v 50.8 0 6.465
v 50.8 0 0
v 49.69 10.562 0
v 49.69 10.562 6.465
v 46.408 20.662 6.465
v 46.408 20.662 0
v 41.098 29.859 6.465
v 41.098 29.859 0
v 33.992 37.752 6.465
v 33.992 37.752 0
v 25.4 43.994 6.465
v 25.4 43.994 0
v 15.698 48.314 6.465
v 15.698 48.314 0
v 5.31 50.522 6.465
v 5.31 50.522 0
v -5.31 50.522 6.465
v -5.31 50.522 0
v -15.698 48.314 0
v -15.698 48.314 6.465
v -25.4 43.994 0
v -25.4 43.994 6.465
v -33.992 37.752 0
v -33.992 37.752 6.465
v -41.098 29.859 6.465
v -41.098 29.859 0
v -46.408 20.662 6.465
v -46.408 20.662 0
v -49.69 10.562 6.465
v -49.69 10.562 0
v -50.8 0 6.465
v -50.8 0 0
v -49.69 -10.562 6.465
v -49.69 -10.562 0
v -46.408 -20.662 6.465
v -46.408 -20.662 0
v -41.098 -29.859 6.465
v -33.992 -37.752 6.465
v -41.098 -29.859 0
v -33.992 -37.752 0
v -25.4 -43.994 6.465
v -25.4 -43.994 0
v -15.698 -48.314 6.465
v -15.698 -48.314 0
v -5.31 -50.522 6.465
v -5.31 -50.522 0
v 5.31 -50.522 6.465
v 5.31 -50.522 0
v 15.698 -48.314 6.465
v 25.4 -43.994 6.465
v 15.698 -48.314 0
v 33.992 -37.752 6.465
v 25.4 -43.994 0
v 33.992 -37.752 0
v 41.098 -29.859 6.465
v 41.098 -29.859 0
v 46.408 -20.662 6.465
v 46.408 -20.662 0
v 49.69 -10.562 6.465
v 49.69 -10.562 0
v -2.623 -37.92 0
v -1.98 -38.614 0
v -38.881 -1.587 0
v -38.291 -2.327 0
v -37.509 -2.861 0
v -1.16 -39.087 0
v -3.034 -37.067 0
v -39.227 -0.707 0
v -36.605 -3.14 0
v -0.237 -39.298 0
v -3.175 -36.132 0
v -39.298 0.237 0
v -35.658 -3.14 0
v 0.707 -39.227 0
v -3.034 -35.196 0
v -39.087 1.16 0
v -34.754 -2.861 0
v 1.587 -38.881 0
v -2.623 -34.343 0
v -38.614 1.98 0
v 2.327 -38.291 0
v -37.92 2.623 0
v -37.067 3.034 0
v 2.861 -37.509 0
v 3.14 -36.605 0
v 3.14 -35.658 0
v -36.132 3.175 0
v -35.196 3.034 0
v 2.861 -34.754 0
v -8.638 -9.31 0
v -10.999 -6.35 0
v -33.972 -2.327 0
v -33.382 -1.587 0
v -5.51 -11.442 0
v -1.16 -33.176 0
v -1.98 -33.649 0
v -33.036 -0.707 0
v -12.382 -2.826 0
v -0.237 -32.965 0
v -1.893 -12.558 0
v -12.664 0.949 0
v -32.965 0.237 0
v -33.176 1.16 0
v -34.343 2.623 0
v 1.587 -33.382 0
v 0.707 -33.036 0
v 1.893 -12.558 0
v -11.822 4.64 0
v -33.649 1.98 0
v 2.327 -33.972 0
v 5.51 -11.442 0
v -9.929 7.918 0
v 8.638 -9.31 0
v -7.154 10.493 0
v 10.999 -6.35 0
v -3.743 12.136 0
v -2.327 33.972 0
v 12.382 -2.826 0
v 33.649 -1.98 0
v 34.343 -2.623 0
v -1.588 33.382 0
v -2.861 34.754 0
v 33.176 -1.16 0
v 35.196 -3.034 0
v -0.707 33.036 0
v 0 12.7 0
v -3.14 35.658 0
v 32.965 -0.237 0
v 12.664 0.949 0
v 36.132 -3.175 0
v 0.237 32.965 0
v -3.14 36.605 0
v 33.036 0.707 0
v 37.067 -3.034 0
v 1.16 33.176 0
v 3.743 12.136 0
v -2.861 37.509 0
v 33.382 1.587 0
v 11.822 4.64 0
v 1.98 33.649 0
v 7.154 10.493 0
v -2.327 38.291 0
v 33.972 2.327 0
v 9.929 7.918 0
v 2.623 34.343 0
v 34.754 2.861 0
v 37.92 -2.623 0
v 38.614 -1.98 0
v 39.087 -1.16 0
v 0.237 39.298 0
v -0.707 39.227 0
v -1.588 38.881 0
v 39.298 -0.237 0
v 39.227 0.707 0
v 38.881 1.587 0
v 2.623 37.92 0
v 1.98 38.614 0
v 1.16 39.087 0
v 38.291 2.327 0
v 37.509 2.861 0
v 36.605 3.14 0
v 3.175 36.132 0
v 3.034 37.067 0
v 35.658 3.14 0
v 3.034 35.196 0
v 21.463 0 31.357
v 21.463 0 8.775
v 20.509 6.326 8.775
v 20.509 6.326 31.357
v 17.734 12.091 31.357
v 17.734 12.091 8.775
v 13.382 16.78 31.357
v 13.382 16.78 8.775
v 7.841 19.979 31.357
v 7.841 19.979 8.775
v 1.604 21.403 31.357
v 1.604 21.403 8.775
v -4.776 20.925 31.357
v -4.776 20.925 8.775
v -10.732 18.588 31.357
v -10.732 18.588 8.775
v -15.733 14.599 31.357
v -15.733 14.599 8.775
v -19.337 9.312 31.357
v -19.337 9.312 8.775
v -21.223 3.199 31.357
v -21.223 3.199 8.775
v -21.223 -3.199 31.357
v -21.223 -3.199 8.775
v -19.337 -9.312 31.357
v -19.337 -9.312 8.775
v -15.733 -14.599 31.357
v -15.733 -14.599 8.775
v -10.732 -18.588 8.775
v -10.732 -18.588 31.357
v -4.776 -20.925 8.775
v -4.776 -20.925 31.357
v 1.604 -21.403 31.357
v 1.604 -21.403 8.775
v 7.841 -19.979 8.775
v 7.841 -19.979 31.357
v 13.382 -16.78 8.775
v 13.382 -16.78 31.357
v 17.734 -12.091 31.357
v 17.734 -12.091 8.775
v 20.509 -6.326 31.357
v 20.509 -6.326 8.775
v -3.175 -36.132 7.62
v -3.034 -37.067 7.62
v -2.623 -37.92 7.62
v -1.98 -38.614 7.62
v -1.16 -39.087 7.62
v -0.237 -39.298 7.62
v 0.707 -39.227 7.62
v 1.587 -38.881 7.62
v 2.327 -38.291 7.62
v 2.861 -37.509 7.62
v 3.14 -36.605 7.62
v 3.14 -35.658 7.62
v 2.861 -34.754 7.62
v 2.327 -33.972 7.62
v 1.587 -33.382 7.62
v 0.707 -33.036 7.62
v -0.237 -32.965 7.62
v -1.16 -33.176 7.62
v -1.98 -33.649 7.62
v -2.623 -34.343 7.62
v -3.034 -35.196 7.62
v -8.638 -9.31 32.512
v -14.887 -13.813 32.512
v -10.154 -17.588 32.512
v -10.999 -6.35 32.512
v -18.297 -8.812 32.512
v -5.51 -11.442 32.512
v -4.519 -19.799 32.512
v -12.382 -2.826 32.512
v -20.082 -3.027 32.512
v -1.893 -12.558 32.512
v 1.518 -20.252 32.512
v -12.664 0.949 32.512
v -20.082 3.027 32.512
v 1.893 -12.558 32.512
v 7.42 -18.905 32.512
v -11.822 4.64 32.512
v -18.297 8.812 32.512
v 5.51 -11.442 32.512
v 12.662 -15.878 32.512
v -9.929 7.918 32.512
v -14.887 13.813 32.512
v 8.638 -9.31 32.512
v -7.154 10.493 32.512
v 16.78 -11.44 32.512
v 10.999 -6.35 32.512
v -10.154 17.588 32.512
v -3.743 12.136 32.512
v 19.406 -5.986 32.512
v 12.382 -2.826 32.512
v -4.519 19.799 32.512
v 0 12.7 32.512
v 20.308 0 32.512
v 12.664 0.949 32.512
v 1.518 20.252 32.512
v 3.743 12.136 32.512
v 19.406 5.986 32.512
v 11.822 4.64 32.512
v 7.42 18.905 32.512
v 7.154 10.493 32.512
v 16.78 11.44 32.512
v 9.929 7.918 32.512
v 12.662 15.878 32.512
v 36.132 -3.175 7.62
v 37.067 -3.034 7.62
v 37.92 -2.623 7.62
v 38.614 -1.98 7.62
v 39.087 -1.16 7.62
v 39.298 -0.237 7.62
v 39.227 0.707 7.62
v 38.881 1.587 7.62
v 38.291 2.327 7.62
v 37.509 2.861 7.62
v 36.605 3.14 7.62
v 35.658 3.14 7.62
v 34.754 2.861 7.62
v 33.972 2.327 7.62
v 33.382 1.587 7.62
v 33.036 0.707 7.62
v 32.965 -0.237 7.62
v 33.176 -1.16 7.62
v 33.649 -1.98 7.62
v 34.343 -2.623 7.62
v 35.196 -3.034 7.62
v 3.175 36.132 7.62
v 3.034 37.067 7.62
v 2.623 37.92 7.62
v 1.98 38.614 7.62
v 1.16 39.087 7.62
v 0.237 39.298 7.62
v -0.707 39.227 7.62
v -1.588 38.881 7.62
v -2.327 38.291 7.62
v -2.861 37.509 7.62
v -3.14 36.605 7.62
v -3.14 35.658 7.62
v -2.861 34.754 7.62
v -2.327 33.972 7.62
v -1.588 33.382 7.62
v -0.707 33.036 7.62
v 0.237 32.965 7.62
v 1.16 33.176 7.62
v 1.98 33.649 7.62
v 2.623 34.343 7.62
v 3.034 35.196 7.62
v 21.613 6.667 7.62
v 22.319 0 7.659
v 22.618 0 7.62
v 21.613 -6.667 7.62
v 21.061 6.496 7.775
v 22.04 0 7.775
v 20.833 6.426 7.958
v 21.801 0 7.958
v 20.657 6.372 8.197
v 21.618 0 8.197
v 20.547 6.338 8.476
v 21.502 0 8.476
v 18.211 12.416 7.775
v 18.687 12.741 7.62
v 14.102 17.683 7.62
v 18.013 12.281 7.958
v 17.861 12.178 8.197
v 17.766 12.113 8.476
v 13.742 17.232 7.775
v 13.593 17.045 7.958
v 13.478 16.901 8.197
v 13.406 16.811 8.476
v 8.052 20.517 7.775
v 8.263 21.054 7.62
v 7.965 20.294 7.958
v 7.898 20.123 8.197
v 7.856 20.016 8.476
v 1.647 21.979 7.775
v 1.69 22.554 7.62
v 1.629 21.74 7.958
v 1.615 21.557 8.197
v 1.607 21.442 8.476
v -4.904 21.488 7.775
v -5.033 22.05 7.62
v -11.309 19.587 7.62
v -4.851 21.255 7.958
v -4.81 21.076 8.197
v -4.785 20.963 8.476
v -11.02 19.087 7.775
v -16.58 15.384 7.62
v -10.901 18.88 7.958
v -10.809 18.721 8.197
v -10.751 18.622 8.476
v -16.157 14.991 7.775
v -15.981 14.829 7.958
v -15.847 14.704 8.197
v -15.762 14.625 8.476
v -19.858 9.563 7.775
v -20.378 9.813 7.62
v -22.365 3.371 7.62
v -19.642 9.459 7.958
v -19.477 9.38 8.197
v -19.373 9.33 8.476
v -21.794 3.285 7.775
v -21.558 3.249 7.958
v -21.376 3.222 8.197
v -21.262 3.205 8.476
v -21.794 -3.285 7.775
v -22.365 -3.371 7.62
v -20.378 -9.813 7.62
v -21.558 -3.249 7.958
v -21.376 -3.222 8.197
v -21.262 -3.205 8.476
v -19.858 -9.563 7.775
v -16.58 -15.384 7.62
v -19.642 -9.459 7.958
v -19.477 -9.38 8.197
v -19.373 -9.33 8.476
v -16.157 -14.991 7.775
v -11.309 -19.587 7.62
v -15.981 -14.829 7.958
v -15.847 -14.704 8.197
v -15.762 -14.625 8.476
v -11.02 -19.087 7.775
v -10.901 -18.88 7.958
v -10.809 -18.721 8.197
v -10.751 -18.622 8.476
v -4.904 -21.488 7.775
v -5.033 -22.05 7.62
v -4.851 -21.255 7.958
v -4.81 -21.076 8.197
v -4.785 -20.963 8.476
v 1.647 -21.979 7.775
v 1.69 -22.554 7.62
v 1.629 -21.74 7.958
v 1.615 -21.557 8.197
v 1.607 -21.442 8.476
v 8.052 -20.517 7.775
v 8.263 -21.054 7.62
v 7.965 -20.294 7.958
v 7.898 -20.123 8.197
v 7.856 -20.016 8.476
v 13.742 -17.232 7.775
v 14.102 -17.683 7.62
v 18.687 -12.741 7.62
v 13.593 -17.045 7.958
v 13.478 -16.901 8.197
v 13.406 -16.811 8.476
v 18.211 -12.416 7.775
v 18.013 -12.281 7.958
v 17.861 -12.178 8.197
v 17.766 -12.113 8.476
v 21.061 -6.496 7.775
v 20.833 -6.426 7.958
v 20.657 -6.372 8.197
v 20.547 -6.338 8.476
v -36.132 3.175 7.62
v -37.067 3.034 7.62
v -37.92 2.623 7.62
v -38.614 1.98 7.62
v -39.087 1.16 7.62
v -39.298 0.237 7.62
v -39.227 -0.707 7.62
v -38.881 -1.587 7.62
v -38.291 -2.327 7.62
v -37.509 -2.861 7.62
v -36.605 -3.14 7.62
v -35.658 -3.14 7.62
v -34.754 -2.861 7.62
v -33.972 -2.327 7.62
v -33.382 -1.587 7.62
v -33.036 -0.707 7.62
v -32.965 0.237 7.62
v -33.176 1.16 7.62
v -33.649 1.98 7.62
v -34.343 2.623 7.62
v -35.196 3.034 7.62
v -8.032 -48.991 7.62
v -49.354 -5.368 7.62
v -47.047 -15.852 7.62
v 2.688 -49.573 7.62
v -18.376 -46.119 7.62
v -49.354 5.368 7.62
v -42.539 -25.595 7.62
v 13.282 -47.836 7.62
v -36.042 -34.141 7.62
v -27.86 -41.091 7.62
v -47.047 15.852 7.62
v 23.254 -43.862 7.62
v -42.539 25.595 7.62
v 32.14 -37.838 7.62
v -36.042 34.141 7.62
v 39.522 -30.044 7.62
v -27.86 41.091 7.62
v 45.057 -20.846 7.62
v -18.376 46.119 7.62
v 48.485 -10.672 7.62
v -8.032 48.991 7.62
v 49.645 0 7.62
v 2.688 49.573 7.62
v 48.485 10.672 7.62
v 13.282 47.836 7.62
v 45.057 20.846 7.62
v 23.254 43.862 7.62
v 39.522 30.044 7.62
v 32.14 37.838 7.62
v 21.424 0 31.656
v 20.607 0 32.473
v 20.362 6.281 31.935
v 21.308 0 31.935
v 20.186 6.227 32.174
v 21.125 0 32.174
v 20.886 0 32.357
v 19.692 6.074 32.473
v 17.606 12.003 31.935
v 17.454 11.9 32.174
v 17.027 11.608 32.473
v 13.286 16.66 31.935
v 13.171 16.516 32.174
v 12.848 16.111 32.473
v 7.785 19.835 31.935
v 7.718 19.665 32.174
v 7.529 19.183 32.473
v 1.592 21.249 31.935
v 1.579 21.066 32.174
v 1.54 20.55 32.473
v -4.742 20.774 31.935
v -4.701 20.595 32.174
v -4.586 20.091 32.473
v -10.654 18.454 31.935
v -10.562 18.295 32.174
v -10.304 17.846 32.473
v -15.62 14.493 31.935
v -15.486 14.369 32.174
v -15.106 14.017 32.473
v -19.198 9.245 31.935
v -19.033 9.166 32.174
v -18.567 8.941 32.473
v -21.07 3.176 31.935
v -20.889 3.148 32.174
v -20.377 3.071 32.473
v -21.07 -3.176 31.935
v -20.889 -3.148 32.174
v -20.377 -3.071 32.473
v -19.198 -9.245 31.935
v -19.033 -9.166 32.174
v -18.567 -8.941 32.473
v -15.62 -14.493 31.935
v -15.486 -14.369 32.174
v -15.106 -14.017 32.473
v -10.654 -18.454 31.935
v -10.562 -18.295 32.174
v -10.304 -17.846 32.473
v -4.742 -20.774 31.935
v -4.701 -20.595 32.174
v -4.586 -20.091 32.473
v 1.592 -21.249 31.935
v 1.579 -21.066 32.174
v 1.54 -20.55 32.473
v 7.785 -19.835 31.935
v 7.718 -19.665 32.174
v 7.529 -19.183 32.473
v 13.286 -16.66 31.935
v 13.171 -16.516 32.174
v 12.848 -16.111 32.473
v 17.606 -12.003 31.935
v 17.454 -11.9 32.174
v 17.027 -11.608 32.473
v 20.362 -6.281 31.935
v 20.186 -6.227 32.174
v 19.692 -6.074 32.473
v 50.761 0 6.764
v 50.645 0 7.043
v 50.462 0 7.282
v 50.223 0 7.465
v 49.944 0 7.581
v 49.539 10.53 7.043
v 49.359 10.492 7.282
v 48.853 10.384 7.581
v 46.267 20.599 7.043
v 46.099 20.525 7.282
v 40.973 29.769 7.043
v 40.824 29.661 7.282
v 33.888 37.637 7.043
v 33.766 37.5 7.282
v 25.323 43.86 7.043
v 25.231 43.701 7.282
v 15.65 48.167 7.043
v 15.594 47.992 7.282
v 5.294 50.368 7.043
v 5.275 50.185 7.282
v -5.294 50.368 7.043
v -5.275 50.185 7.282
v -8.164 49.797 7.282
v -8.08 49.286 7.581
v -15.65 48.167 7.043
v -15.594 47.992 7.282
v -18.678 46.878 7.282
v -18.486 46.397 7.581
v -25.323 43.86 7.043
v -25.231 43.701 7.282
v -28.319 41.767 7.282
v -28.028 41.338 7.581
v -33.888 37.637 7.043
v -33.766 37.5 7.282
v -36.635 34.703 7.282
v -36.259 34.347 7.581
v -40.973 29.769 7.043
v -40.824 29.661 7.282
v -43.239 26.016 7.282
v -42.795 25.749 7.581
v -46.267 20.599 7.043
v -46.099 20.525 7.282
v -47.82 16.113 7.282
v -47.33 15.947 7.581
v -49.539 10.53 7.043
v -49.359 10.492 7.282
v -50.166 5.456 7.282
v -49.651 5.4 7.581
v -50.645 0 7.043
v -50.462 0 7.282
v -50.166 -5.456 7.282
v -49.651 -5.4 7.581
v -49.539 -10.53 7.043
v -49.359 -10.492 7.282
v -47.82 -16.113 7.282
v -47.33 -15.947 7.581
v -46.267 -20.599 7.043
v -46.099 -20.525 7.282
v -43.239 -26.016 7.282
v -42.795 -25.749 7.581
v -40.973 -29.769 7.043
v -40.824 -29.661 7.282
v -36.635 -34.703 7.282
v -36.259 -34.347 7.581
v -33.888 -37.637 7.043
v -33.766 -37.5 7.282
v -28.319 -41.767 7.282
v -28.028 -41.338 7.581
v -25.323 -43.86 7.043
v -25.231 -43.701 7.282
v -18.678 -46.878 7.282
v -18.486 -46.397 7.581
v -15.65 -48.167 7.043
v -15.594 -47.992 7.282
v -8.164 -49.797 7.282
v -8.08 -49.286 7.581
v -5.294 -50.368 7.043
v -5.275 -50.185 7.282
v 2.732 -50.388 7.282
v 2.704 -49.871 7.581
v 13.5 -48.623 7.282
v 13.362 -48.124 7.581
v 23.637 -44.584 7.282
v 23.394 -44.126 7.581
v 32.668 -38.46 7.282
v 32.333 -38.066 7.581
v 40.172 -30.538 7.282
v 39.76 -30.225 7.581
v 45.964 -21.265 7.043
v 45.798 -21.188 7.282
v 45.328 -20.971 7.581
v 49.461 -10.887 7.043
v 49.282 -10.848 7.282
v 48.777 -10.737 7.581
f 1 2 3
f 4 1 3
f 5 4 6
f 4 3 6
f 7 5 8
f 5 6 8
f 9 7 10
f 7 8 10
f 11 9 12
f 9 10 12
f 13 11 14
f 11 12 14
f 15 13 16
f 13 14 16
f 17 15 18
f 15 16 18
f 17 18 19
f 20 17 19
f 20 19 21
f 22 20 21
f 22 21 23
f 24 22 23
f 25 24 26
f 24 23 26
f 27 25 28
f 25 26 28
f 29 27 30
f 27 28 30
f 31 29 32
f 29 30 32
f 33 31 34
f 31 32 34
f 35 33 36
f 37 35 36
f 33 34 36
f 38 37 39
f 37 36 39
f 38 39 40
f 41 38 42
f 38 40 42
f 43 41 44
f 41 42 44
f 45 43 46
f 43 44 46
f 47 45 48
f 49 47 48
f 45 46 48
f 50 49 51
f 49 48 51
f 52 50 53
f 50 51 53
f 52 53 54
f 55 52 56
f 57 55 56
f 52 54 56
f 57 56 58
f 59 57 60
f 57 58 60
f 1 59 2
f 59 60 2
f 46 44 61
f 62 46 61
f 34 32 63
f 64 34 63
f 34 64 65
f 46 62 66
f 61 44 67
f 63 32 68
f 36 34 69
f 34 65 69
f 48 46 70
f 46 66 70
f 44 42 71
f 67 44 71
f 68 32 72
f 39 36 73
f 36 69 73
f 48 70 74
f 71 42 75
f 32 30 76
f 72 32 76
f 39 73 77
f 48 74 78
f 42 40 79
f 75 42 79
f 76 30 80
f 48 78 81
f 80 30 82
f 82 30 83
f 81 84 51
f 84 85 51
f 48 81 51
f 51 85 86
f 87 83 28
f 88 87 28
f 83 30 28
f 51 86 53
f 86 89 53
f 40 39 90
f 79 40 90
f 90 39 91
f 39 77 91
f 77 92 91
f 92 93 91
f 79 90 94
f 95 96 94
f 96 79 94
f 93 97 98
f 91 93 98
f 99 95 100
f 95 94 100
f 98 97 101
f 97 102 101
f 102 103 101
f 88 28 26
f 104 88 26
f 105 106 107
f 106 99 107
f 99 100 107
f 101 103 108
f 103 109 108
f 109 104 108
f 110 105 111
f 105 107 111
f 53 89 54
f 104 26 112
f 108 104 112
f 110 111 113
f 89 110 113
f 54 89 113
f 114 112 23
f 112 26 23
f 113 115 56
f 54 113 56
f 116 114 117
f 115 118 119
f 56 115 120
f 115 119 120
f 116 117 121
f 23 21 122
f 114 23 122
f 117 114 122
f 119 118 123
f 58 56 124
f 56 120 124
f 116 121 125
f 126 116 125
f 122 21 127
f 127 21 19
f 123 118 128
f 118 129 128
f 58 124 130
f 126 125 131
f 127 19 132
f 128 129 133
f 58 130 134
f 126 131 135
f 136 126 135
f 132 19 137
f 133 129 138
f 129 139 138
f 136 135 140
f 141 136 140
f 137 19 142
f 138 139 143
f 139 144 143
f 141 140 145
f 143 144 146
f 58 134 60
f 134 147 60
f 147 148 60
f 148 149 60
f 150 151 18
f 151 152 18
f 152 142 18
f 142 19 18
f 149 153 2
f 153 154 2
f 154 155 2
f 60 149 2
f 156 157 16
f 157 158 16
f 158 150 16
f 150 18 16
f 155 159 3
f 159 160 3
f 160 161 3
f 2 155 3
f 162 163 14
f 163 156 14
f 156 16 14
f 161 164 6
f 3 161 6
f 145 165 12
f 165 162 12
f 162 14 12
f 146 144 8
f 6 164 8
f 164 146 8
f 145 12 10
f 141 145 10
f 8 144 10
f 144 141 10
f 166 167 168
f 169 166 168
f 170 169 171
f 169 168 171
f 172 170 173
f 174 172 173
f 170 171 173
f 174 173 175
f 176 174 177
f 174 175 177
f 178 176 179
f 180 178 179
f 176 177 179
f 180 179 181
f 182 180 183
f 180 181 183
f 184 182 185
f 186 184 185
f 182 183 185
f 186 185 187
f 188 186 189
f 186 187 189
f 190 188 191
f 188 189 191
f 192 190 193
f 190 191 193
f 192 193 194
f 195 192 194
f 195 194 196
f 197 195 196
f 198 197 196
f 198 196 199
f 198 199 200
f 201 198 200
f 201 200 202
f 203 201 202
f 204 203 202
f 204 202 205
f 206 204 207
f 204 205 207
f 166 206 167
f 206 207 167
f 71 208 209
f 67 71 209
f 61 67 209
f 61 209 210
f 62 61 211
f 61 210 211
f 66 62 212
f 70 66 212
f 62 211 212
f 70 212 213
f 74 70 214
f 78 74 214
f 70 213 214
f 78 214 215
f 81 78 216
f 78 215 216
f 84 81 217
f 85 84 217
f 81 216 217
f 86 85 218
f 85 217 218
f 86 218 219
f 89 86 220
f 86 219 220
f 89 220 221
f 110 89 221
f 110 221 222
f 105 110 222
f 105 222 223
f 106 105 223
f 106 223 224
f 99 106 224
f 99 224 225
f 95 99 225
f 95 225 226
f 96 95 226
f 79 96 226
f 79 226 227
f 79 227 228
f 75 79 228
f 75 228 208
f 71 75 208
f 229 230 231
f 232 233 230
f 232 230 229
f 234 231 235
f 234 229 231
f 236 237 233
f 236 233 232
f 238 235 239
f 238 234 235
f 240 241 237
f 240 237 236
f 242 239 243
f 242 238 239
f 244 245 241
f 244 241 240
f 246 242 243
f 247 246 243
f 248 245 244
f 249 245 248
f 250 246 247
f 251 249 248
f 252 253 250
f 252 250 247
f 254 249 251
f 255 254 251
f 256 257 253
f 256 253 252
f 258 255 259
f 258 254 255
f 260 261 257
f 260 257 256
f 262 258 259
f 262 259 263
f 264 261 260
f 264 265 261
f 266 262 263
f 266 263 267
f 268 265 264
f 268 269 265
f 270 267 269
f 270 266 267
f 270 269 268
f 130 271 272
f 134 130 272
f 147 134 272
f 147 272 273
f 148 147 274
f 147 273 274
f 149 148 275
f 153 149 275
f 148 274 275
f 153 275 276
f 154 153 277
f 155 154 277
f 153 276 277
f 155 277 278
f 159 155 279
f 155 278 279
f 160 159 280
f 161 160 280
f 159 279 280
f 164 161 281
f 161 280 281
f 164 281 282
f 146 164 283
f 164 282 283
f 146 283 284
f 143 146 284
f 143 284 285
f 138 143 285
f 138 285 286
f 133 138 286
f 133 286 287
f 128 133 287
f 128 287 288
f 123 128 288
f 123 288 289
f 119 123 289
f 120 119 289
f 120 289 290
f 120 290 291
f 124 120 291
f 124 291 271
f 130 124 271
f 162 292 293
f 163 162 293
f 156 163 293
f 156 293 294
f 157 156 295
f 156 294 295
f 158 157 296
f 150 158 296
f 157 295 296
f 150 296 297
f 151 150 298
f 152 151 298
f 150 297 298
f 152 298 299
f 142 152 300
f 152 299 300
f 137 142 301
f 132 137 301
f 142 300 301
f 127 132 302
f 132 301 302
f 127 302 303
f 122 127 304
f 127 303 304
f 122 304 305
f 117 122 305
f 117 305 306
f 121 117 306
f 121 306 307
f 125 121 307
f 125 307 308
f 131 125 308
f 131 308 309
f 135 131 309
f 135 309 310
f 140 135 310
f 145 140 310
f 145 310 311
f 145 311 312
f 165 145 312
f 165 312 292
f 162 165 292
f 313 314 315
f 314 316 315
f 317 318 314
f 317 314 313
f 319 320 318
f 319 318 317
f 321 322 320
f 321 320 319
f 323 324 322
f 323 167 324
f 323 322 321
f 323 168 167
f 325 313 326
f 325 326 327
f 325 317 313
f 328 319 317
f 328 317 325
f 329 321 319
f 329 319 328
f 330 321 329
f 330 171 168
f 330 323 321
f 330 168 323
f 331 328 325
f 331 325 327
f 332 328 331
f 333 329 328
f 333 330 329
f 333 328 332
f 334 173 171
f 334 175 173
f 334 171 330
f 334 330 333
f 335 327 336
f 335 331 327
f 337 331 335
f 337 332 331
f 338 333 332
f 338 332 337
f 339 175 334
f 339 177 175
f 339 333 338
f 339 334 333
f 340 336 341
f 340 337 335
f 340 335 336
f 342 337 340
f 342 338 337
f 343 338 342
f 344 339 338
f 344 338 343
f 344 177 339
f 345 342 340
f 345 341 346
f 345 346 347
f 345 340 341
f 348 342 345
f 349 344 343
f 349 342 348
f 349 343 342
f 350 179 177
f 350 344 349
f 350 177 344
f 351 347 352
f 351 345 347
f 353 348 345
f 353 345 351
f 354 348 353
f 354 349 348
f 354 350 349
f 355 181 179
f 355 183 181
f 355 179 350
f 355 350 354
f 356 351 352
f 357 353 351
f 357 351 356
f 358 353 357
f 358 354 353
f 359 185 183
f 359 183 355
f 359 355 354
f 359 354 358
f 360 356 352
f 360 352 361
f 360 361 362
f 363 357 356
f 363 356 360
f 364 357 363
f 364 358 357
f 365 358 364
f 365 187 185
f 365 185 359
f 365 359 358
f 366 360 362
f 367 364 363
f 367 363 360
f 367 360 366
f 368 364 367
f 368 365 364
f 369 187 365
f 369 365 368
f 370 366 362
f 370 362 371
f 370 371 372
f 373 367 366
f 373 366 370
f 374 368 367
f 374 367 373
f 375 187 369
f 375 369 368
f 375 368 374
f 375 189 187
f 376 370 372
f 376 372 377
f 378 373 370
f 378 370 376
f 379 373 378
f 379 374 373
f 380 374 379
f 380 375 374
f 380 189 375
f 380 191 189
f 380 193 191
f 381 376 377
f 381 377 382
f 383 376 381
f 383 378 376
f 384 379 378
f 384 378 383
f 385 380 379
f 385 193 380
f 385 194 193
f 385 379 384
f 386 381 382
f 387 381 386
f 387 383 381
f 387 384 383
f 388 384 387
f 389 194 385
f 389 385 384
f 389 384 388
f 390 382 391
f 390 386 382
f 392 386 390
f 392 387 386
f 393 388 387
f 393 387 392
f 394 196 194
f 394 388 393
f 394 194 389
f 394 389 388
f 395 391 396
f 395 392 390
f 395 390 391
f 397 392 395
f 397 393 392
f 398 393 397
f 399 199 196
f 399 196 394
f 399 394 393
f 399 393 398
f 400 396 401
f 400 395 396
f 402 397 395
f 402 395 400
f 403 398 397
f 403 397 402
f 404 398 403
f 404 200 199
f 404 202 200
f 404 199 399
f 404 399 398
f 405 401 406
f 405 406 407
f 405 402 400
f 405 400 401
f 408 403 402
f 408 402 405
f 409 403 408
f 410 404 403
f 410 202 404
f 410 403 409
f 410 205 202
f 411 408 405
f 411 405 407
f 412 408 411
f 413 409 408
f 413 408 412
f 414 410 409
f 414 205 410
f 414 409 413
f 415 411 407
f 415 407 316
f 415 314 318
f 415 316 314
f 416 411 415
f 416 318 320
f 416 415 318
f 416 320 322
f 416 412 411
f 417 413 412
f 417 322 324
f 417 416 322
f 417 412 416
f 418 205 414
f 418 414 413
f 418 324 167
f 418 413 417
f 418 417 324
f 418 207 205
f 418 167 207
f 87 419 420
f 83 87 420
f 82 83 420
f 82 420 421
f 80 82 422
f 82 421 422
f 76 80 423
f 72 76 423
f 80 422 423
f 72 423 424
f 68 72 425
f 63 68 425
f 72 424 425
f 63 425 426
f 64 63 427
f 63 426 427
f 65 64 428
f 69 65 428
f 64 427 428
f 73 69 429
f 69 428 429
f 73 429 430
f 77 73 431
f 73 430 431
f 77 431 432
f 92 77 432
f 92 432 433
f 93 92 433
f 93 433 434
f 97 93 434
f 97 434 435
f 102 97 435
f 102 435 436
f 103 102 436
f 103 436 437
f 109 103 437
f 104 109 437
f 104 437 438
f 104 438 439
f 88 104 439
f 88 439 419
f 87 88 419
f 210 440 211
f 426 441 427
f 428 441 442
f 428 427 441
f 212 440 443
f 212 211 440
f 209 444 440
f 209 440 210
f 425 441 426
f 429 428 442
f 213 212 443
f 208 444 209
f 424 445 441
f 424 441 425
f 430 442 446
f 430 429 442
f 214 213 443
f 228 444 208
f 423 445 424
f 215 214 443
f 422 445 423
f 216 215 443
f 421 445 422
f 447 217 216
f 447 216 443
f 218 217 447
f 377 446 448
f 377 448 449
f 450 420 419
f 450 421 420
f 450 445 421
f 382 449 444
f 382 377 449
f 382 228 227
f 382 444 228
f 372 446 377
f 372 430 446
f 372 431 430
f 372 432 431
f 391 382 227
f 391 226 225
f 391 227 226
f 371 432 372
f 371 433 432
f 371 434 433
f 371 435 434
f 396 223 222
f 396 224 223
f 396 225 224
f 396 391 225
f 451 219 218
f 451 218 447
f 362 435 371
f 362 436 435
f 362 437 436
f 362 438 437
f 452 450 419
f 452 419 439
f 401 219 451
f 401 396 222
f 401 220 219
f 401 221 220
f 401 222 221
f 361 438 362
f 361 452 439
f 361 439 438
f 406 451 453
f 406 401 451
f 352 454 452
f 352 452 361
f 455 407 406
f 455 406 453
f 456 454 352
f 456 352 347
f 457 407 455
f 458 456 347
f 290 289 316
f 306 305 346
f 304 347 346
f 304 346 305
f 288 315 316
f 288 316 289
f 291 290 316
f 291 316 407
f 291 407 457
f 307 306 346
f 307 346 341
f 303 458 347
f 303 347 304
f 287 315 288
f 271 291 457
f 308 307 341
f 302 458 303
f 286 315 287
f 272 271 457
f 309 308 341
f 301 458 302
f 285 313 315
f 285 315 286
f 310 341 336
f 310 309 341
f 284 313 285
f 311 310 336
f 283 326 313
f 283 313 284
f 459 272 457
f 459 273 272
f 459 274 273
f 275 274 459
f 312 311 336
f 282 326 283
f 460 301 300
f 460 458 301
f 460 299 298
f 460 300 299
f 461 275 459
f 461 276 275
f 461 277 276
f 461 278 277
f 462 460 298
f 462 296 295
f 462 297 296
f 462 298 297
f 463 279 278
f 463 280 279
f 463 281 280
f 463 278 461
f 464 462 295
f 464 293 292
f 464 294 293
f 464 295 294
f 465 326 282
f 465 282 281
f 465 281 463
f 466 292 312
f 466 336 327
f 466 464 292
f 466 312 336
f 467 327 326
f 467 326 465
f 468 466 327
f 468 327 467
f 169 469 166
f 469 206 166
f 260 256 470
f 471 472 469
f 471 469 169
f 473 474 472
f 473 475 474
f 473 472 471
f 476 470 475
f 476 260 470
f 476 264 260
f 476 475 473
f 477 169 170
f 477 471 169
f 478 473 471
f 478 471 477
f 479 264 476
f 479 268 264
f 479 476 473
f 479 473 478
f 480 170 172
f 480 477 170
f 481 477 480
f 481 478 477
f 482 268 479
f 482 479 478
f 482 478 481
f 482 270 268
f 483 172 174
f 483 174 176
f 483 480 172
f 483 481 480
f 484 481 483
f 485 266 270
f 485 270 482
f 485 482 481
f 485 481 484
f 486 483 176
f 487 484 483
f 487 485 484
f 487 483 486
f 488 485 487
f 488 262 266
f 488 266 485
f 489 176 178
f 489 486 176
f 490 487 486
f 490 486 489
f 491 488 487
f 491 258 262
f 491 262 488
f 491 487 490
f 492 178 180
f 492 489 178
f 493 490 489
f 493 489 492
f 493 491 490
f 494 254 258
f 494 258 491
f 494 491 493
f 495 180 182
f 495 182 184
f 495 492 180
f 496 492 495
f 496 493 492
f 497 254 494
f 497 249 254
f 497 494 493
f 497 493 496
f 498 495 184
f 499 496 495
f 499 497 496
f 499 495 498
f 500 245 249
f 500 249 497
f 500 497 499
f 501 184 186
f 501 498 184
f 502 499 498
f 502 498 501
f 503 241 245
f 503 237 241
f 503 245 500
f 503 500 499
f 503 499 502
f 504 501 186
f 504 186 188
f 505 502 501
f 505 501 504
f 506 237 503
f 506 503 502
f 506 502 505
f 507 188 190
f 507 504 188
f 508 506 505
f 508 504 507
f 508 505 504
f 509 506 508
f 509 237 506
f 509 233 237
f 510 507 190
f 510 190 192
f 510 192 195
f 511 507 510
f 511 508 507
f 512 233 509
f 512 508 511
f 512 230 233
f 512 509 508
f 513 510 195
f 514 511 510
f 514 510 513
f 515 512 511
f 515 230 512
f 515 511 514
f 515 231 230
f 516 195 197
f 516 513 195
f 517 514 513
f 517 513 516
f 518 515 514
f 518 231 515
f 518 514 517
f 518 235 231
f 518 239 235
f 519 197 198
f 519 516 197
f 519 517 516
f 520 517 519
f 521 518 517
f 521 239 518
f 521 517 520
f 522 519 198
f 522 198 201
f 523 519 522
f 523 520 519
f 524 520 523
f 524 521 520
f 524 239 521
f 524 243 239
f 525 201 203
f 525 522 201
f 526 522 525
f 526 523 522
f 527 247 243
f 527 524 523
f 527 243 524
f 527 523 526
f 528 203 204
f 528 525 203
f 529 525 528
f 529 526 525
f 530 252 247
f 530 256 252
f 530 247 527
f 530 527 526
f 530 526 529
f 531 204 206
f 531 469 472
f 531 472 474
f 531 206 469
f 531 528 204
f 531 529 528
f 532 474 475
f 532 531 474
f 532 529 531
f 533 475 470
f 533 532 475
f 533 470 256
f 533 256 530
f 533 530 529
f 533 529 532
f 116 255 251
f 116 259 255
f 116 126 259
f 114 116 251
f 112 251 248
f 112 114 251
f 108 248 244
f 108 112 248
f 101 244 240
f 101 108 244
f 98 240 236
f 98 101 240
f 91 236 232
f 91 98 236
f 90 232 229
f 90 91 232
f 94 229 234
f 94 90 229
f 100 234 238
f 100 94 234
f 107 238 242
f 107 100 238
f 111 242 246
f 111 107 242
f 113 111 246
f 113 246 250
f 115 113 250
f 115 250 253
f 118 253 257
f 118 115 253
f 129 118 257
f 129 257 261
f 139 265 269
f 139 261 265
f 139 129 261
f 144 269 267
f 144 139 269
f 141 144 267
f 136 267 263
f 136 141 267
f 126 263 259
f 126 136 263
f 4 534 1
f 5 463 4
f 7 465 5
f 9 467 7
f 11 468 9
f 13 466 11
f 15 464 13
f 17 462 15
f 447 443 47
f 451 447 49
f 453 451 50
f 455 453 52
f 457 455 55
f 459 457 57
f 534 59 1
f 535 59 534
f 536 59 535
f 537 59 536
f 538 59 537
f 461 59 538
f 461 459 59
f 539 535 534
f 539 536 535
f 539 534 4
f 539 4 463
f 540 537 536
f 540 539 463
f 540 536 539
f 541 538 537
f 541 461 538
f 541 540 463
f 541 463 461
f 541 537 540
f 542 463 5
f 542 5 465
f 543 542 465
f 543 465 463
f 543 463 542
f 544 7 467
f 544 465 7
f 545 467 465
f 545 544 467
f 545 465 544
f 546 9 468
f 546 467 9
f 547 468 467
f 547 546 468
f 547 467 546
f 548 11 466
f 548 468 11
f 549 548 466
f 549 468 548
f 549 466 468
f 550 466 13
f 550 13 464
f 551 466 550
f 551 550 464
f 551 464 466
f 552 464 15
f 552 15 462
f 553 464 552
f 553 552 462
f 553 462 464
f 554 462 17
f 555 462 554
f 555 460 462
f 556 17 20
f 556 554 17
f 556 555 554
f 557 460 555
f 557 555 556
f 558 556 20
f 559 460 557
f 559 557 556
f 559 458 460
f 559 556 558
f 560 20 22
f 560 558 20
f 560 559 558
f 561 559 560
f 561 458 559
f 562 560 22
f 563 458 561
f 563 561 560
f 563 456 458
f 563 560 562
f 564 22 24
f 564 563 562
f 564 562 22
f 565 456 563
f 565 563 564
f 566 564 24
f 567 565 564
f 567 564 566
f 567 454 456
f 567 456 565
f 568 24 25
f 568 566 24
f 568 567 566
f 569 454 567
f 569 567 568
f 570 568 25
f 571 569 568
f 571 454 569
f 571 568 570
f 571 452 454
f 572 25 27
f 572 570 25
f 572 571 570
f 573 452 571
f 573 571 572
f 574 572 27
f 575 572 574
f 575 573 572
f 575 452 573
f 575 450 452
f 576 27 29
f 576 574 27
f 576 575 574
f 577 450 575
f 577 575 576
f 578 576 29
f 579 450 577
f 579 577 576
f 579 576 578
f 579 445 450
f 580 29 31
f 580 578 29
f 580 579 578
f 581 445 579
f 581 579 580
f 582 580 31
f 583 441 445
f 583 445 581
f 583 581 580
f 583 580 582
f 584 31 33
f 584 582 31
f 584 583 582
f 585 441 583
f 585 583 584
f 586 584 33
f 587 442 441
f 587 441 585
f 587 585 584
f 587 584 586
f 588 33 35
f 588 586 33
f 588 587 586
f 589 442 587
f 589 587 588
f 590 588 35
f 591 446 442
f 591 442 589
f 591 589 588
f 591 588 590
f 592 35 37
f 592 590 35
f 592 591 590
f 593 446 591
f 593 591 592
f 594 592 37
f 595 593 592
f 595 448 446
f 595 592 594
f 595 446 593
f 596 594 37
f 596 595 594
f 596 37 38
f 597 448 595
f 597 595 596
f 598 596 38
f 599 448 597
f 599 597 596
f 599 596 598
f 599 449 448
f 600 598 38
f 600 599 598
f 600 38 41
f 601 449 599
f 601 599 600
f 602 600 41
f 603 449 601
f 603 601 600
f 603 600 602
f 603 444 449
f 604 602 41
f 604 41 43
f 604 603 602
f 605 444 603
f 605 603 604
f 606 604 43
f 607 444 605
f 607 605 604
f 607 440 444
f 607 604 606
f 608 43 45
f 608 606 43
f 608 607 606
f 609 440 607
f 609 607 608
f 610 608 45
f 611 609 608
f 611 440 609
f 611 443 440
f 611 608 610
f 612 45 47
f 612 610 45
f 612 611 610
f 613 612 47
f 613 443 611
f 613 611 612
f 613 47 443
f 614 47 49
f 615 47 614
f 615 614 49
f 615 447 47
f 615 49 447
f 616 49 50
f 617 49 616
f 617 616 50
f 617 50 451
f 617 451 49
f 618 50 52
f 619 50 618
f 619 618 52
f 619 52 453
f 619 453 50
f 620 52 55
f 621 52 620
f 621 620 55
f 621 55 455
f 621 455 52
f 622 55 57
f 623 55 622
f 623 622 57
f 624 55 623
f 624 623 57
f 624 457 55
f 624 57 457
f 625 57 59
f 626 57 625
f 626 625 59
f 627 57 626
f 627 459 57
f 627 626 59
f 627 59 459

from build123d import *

# Parameters (mm, degrees)
SKETCH1_R         = 50.8
EXTRUDE1_DEPTH    = 7.62
SKETCH2_R         = 21.463
EXTRUDE2_DEPTH    = 24.892
SKETCH3_R         = 3.175
EXTRUDE3_DEPTH    = 8.62
CIRPATTERN1_COUNT = 4
FILLET1_R         = 1.154545455
SKETCH4_W         = 79.017488084
SKETCH4_H         = 12.7


with BuildPart() as part:
    # Sketch1 → Extrude1 (new body)
    with BuildSketch(Plane.XY):
        Circle(SKETCH1_R)
    extrude(amount=EXTRUDE1_DEPTH)

    # Sketch2 → Extrude2 (add)
    with BuildSketch(Plane.XY.offset(7.62)):
        Circle(SKETCH2_R)
    extrude(amount=EXTRUDE2_DEPTH)

    # Sketch3 → Extrude3 (cut, through all)
    with BuildSketch(Plane.XY.offset(7.62)):
        with Locations((0, 36.1315)):
            Circle(SKETCH3_R)
    extrude3 = extrude(amount=-EXTRUDE3_DEPTH, mode=Mode.SUBTRACT)

    # CirPattern1: Extrude3 ×4 about axis
    cirpattern1_axis = Axis((0, 0, 0), (0, 0, 1))
    for i in range(1, CIRPATTERN1_COUNT):
        add(extrude3.rotate(cirpattern1_axis, i * 360 / CIRPATTERN1_COUNT), mode=Mode.SUBTRACT)

    # Fillet1
    fillet1_edges = [part.edges().sort_by_distance(p)[0] for p in [
        (-50.8, 0, 7.62),
        (-21.463, 0, 7.62),
        (-21.463, 0, 32.512),
    ]]
    fillet(fillet1_edges, radius=FILLET1_R)

    # Sketch4 → Cut-Revolve1 (revolve, cut)
    with BuildSketch(Plane(origin=(0, 0, 63.5), x_dir=(0, 0, -1), z_dir=(1, 0, 0))):
        with Locations((39.507700489, 6.35)):
            Rectangle(SKETCH4_W, SKETCH4_H)
    revolve(axis=Axis((0, 0, -15.516444531), (0, 0, 1)), mode=Mode.SUBTRACT)


solid = part.part
